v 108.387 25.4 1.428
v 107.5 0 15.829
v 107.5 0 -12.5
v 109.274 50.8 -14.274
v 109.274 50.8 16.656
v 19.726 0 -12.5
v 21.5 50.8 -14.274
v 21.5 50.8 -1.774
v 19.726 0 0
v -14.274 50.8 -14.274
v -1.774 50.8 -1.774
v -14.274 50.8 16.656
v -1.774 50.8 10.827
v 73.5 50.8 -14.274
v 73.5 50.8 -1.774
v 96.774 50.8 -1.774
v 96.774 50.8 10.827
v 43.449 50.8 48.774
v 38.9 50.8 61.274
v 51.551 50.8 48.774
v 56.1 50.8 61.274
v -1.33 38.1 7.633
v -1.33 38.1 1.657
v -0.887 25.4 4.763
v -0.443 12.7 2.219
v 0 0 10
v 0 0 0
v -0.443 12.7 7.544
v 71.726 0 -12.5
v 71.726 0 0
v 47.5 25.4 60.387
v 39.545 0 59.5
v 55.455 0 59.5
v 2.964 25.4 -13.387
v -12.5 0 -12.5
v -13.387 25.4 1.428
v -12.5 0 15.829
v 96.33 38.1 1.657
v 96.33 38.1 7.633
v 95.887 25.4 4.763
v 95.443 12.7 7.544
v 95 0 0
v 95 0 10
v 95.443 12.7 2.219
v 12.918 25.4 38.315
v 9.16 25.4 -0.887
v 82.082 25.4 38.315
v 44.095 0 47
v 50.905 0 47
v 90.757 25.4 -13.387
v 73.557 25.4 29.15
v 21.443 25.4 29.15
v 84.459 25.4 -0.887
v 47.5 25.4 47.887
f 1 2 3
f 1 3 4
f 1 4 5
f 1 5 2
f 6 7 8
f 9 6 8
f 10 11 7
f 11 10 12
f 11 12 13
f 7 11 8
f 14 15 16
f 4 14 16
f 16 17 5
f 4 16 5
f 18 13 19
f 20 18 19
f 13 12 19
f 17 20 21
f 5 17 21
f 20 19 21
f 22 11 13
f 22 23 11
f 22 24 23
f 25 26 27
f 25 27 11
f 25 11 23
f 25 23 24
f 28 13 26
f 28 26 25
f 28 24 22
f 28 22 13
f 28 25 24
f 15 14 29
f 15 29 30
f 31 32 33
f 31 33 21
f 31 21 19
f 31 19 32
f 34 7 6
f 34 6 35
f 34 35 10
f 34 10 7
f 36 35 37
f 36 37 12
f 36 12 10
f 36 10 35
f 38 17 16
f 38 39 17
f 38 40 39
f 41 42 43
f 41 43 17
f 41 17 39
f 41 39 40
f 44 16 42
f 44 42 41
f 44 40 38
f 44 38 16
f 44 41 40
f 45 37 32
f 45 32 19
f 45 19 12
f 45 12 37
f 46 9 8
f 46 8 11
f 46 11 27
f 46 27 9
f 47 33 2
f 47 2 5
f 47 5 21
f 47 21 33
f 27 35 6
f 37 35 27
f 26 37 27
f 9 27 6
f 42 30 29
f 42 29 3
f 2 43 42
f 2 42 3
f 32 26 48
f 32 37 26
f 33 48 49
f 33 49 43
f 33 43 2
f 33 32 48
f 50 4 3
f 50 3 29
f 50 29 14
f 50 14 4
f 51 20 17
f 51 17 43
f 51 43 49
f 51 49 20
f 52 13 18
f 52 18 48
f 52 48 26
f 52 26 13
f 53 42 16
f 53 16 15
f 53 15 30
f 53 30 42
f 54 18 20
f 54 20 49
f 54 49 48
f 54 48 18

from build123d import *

# Parameters (mm, degrees)
SALIENTE_EXTRUIR1_DEPTH = 50.8
SALIENTE_EXTRUIR1_TAPER = -2
CORTAR_EXTRUIR1_DEPTH   = 50.8
CORTAR_EXTRUIR1_TAPER   = 2
CROQUIS5_W              = 52
CROQUIS5_H              = 12.5
CORTAR_EXTRUIR2_DEPTH   = 51.863129667


with BuildPart() as part:
    # Croquis2 → Saliente-Extruir1 (new body)
    with BuildSketch(Plane(origin=(0, 0, 0), x_dir=(1, 0, 0), z_dir=(0, 1, 0))):
        Polygon((-12.5, 12.5), (-12.5, -15.828845727), (39.545254998, -59.5), (55.454745002, -59.5), (107.5, -15.828845727), (107.5, 12.5), align=None)
    extrude(amount=SALIENTE_EXTRUIR1_DEPTH, taper=SALIENTE_EXTRUIR1_TAPER)

    # Croquis3 → Cortar-Extruir1 (cut)
    with BuildSketch(Plane(origin=(0, 50.8, 0), x_dir=(1, 0, 0), z_dir=(0, 1, 0))):
        Polygon((-1.77397509, 1.77397509), (-1.77397509, -10.82721817), (43.449208797, -48.77397509), (51.550791203, -48.77397509), (96.77397509, -10.82721817), (96.77397509, 1.77397509), align=None)
    extrude(amount=-CORTAR_EXTRUIR1_DEPTH, taper=CORTAR_EXTRUIR1_TAPER, mode=Mode.SUBTRACT)

    # Croquis5 → Cortar-Extruir2 (cut, through all, along a direction that is not the sketch's normal)
    with BuildSketch(Plane.XZ.offset(-50.8)):
        with Locations((47.5, -8.02397509)):
            Rectangle(CROQUIS5_W, CROQUIS5_H)
    extrude(amount=CORTAR_EXTRUIR2_DEPTH, dir=(-0.034878263, -0.998782766, 0.034878263), mode=Mode.SUBTRACT)


solid = part.part
